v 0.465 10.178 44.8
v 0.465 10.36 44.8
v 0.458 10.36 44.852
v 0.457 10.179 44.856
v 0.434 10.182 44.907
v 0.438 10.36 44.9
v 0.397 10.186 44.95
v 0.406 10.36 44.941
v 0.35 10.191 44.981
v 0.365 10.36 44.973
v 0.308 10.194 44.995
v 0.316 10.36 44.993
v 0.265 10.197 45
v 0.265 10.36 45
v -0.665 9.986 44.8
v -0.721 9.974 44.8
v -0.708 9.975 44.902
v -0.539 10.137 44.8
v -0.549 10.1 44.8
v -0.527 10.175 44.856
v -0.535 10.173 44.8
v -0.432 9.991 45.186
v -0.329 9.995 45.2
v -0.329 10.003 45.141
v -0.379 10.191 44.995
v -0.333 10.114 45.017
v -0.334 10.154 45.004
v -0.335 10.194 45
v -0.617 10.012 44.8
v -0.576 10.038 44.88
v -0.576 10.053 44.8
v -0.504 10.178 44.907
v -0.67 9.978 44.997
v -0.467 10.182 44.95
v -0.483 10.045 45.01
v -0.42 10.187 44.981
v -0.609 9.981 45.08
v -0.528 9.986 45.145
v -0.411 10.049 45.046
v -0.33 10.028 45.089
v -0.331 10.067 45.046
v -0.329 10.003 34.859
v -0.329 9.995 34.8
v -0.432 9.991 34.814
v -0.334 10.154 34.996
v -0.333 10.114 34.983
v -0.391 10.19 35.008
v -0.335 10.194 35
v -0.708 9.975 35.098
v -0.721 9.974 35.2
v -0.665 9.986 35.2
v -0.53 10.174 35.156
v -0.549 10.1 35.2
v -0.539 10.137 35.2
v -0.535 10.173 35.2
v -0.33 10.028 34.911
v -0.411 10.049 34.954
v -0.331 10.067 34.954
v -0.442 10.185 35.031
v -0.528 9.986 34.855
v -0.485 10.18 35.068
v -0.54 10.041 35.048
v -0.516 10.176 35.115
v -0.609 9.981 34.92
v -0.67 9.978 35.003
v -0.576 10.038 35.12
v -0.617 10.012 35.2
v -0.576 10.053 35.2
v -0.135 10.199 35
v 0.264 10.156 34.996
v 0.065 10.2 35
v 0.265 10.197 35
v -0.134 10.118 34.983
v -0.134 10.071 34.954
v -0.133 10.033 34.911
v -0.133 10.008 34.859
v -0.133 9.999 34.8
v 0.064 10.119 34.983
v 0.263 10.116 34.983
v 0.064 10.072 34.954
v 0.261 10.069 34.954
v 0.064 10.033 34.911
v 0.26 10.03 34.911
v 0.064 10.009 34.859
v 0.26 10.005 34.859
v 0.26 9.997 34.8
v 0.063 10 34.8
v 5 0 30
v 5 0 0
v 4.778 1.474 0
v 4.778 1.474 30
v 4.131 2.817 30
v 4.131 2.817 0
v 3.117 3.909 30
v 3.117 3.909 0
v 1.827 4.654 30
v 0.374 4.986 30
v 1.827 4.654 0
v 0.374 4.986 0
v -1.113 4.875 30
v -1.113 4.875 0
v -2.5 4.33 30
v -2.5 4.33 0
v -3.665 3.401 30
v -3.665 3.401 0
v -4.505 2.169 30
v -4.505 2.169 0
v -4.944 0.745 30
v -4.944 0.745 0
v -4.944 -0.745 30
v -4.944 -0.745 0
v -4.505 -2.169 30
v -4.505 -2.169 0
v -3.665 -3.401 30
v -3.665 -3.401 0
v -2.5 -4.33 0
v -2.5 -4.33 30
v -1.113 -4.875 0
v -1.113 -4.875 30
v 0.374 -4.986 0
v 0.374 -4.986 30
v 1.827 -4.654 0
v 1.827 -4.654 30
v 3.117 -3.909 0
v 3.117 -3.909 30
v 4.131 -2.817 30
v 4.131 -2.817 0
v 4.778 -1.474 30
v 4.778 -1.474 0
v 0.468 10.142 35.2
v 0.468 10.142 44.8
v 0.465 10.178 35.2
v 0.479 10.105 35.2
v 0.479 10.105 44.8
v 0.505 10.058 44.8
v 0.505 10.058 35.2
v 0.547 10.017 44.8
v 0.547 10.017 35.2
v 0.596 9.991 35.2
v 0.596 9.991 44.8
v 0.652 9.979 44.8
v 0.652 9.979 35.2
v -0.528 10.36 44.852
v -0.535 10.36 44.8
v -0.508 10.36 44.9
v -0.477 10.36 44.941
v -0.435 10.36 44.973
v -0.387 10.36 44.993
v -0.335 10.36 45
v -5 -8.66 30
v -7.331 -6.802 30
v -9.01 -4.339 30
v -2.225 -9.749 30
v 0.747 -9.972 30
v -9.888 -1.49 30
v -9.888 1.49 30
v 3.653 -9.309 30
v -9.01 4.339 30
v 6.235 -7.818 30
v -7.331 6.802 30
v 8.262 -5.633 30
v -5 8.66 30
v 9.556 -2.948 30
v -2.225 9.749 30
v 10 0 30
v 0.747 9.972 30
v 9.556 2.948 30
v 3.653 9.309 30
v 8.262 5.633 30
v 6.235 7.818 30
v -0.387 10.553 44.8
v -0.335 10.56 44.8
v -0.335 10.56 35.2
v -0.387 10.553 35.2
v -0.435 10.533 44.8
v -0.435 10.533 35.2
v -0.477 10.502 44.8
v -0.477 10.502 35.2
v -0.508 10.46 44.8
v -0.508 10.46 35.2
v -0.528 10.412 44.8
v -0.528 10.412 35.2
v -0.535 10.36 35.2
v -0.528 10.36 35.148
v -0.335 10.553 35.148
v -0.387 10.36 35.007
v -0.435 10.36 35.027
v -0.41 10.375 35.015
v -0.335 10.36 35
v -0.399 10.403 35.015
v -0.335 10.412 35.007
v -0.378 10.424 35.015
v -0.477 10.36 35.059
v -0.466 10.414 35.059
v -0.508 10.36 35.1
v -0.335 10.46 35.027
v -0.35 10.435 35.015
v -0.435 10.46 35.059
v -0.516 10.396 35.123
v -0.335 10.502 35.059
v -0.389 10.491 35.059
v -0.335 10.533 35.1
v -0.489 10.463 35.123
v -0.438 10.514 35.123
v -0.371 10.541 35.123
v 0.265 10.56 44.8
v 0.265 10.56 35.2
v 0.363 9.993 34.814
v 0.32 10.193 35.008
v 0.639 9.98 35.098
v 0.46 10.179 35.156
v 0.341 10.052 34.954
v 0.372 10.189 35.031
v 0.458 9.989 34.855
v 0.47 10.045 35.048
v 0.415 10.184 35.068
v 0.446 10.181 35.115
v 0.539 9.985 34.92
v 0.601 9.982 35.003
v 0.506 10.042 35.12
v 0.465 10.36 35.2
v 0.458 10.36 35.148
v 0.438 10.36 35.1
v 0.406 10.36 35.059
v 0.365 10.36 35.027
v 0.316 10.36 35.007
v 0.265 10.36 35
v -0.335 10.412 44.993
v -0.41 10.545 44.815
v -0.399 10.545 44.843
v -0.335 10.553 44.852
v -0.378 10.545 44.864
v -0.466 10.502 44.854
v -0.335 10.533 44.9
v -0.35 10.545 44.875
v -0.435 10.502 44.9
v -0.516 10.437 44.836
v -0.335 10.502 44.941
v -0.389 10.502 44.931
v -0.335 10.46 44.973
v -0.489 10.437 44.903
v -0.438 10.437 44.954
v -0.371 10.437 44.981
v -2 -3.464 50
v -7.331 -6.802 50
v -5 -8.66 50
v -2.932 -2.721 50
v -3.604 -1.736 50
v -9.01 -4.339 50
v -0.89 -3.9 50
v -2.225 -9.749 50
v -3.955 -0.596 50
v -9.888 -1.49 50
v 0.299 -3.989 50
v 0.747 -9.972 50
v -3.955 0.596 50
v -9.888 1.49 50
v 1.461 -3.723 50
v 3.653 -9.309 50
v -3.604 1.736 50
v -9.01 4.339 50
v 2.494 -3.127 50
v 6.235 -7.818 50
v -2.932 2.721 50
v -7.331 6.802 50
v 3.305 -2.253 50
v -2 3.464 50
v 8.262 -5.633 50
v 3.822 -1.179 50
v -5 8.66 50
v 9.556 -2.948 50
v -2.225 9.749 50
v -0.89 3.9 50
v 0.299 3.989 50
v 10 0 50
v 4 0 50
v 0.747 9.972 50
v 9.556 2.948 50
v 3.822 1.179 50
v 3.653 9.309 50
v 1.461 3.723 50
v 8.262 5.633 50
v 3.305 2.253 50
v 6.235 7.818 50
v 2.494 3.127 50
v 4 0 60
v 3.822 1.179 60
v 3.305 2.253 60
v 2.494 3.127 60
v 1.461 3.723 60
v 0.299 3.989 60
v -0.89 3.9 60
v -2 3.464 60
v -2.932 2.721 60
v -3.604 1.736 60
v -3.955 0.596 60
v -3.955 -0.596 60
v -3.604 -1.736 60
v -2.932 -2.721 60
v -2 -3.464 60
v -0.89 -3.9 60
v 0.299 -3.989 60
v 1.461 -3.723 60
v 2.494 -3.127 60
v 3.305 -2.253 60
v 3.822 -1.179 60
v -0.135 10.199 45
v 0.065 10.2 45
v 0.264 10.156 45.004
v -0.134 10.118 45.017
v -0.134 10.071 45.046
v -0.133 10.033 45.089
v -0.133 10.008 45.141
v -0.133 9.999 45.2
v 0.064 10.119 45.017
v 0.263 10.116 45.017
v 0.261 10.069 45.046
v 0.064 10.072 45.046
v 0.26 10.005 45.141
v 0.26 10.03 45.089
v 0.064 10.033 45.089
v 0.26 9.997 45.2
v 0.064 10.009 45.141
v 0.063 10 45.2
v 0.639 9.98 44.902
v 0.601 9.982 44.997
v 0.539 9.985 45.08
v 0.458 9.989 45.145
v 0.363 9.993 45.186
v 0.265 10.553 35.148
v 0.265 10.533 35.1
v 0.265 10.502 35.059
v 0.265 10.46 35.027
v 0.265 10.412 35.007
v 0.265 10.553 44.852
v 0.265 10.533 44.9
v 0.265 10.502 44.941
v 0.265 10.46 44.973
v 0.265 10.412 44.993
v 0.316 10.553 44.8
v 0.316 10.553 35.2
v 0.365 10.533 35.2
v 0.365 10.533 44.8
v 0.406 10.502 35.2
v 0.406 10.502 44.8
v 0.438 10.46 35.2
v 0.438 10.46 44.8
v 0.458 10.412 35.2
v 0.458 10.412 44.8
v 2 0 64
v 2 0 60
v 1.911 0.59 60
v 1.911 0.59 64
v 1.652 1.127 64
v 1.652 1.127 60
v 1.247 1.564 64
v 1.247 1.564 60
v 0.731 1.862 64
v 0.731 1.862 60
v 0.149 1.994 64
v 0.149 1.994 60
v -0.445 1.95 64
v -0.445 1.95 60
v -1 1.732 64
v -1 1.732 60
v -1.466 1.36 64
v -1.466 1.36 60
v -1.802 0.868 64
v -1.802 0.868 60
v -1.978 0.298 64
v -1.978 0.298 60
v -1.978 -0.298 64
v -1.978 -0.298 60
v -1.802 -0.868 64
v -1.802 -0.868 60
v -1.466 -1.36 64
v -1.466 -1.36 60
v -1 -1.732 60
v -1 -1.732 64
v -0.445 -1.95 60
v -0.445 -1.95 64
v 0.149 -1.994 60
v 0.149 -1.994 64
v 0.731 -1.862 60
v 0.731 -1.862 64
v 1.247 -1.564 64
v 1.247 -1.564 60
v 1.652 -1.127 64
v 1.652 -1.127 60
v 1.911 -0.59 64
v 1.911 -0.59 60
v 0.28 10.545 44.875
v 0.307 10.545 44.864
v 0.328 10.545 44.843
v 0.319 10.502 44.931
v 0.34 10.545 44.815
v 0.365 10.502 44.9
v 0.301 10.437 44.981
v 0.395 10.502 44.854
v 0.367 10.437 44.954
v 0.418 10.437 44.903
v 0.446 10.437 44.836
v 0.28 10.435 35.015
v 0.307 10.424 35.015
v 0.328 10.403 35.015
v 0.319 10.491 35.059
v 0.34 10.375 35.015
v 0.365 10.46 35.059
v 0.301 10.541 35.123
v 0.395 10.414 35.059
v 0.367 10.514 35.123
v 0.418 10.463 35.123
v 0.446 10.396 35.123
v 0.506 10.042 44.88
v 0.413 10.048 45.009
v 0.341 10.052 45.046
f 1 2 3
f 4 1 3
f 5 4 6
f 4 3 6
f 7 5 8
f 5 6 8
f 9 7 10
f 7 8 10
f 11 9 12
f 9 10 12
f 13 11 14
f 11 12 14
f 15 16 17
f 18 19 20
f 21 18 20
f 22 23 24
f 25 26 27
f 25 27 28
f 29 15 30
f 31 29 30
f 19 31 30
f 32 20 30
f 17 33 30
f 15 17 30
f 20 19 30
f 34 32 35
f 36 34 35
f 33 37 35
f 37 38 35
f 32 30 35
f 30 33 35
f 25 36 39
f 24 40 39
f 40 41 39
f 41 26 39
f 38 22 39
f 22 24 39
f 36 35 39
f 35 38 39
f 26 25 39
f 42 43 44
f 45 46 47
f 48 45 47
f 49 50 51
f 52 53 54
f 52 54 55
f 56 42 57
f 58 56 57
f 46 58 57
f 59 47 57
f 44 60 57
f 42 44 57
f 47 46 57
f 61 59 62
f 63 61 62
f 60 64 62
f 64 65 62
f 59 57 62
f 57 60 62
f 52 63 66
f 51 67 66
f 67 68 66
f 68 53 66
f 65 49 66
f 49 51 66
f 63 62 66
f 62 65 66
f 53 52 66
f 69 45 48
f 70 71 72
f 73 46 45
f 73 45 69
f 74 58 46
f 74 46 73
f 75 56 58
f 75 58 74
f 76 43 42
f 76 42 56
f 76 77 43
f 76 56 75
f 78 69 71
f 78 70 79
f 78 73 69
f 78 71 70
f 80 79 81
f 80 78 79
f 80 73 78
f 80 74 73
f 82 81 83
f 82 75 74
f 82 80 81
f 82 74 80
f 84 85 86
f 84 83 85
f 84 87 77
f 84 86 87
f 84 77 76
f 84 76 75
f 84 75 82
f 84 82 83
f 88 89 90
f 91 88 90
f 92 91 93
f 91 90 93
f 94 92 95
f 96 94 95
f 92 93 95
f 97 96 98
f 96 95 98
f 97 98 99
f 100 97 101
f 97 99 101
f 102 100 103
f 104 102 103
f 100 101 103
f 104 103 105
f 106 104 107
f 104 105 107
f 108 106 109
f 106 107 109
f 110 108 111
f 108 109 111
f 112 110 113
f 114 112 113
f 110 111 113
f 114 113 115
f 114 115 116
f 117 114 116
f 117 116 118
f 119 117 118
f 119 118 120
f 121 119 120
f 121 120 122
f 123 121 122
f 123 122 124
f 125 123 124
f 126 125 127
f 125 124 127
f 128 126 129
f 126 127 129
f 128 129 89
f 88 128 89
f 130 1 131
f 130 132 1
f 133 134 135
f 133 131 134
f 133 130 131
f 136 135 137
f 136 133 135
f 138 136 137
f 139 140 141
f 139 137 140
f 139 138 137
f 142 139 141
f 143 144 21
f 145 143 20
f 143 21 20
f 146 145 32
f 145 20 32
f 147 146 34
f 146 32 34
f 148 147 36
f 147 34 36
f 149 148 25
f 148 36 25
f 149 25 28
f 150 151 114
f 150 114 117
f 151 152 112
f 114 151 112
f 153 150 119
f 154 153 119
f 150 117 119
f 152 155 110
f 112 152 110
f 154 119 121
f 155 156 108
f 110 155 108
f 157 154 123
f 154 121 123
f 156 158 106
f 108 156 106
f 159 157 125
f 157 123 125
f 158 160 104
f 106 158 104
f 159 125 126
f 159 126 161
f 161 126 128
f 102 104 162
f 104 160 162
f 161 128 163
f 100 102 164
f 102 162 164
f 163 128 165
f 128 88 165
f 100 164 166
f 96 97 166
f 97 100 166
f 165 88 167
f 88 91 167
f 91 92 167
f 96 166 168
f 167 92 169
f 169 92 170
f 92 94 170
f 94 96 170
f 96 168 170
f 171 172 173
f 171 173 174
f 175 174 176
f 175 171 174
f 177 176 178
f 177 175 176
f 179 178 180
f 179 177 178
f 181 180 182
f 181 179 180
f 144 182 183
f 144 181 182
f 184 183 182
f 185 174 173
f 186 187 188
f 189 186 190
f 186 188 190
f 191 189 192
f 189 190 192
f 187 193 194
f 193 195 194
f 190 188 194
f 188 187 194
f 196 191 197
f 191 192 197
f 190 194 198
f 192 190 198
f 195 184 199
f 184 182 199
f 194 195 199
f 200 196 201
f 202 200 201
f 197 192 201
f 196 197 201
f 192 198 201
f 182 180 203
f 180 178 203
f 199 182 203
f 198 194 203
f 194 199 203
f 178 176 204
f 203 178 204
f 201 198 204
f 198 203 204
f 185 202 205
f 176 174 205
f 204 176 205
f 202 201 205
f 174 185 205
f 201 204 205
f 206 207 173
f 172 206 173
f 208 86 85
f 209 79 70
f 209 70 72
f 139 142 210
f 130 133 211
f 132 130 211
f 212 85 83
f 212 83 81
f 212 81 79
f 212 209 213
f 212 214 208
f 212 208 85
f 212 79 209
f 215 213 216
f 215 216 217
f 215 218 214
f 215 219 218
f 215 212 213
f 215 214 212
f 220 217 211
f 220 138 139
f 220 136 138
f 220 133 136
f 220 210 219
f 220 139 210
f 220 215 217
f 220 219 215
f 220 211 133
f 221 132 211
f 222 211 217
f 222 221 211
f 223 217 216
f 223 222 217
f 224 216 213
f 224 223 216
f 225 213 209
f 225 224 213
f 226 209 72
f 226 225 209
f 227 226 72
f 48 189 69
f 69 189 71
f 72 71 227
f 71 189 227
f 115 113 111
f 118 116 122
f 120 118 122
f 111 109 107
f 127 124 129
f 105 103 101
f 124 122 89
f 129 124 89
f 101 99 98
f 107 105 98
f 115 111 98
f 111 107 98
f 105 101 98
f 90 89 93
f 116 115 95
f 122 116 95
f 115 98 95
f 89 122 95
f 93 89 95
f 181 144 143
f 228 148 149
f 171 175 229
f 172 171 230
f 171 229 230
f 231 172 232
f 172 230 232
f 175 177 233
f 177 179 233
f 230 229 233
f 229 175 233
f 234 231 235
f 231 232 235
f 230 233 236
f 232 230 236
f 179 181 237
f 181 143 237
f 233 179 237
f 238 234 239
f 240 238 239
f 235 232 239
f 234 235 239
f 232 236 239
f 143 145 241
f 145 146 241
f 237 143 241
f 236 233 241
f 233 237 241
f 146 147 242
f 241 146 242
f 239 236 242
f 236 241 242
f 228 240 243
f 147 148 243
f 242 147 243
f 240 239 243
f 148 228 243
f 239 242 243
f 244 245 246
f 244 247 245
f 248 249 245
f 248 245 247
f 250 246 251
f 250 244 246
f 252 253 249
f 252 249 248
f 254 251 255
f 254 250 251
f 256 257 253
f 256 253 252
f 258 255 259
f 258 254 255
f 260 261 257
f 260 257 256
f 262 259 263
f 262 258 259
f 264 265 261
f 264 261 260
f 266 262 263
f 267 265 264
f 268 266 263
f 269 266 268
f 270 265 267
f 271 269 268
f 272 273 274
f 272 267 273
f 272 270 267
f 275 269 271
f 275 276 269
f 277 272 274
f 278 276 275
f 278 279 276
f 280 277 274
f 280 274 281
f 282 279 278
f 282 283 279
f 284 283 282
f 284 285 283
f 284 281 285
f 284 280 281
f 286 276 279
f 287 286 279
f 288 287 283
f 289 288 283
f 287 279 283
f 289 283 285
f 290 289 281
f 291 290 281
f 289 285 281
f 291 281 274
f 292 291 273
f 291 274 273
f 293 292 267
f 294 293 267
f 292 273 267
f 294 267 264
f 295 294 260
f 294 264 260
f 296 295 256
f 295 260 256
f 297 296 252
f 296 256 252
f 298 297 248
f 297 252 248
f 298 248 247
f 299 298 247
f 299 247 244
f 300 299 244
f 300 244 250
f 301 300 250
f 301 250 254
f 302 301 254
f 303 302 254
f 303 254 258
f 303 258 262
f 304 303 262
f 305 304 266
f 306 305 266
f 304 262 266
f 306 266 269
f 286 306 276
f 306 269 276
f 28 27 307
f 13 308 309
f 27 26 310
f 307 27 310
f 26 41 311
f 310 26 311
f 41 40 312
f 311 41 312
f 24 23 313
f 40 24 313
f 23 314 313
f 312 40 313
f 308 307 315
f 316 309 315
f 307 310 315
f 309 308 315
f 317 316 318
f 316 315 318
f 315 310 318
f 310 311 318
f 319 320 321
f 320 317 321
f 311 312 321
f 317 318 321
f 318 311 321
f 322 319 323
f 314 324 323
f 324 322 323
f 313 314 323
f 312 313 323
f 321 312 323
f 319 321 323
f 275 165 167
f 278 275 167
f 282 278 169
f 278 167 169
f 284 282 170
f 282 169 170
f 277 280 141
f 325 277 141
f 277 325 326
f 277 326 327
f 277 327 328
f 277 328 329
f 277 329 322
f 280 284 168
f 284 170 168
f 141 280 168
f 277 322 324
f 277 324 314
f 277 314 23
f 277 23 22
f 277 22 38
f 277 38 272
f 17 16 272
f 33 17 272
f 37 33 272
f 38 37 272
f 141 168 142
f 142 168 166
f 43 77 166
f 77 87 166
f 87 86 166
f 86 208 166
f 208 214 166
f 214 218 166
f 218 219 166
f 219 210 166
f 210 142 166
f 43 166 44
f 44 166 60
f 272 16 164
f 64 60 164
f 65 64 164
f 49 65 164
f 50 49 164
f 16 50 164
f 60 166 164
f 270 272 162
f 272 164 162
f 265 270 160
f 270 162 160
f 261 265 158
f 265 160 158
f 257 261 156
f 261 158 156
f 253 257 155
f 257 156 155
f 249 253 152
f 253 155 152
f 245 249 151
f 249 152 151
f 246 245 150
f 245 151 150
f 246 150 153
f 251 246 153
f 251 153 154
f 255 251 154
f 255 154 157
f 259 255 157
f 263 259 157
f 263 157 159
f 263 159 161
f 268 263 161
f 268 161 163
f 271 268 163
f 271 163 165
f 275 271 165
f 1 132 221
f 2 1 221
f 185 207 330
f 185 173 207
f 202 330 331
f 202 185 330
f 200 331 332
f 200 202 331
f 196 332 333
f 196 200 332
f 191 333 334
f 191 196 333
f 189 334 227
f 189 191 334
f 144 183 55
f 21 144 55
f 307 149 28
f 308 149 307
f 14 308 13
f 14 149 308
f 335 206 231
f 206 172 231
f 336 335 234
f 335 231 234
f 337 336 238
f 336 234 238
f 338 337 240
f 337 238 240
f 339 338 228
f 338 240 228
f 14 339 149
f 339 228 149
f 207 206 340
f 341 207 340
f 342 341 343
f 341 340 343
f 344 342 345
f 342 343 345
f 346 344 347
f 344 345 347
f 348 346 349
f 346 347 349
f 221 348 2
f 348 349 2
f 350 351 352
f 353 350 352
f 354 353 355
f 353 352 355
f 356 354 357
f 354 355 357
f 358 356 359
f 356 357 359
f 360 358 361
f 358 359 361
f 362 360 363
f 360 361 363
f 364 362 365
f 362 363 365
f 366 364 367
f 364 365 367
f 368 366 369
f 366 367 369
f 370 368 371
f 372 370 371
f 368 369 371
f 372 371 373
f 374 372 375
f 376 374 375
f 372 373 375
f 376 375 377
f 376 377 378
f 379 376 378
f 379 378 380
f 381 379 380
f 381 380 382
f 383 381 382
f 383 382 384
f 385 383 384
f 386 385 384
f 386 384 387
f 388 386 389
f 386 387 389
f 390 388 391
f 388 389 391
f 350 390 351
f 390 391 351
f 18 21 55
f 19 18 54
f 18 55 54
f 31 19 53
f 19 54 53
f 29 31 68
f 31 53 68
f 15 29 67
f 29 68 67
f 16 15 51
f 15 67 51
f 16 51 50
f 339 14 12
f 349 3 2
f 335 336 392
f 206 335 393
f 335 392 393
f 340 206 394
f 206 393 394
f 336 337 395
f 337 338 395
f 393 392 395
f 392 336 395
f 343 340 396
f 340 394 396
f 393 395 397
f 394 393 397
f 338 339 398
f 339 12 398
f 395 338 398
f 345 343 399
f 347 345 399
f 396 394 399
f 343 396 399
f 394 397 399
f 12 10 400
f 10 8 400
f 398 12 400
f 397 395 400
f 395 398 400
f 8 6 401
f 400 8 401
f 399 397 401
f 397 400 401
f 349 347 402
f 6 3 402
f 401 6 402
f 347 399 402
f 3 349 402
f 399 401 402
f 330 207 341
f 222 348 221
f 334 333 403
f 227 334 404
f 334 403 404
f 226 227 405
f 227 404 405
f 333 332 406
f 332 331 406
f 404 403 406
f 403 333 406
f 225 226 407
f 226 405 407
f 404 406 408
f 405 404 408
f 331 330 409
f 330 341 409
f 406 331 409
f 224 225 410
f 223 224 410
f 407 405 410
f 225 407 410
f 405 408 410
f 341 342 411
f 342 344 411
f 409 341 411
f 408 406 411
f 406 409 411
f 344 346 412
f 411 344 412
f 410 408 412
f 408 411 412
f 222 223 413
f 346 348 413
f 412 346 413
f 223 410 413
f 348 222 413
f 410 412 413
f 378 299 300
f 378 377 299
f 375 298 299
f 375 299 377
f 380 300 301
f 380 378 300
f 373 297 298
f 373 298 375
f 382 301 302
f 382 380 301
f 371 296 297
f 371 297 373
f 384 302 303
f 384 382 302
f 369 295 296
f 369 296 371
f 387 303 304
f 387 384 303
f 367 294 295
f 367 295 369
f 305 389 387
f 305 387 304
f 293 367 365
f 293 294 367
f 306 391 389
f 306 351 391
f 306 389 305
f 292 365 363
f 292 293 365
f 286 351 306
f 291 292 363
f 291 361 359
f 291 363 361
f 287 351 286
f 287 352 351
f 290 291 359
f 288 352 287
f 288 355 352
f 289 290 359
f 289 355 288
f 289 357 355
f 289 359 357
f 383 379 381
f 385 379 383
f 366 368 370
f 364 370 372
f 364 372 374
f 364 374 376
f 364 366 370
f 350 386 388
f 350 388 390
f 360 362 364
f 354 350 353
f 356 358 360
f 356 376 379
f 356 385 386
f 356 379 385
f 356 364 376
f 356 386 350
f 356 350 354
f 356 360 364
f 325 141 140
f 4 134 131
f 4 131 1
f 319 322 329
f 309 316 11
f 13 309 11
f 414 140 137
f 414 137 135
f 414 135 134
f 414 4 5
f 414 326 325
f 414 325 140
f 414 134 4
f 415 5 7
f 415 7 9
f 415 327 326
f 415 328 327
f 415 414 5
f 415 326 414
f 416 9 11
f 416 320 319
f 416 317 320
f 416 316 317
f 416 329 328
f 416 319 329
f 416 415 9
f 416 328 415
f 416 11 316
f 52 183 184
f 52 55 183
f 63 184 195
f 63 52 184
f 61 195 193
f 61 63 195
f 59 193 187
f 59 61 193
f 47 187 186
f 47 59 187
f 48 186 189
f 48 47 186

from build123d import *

# Parameters (mm, degrees)
SKETCH1_R           = 5
BOSS_EXTRUDE1_DEPTH = 30
SKETCH2_R           = 10
BOSS_EXTRUDE2_DEPTH = 20
SKETCH3_R           = 4
BOSS_EXTRUDE3_DEPTH = 10
SKETCH4_R           = 2
BOSS_EXTRUDE4_DEPTH = 4
BOSS_EXTRUDE5_START = -5
BOSS_EXTRUDE5_DEPTH = 10
FILLET1_R           = 0.2


with BuildPart() as part:
    # Sketch1 → Boss-Extrude1 (new body)
    with BuildSketch(Plane.XY):
        Circle(SKETCH1_R)
    extrude(amount=BOSS_EXTRUDE1_DEPTH)

    # Sketch2 → Boss-Extrude2 (add)
    with BuildSketch(Plane.XY.offset(30)):
        Circle(SKETCH2_R)
    extrude(amount=BOSS_EXTRUDE2_DEPTH)

    # Sketch3 → Boss-Extrude3 (add)
    with BuildSketch(Plane.XY.offset(50)):
        Circle(SKETCH3_R)
    extrude(amount=BOSS_EXTRUDE3_DEPTH)

    # Sketch4 → Boss-Extrude4 (add)
    with BuildSketch(Plane.XY.offset(60)):
        Circle(SKETCH4_R)
    extrude(amount=BOSS_EXTRUDE4_DEPTH)

    # Sketch5 → Boss-Extrude5 (add)
    with BuildSketch(Plane(origin=(0, 0, 30), x_dir=(-1, 0, 0), z_dir=(0, 0, -1)).offset(BOSS_EXTRUDE5_START)):
        with BuildLine():
            Line((-0.464729596, 10.560180083), (0.535270404, 10.560180083))
            Line((0.535270404, 10.560180083), (0.535270404, 9.960180083))
            ThreePointArc((0.535270404, 9.960180083), (0.035314802, 9.97449019), (-0.464729596, 9.963720595))
            Line((-0.464729596, 9.963720595), (-0.464729596, 10.560180083))
        make_face()
    extrude(amount=-BOSS_EXTRUDE5_DEPTH)

    # Fillet1
    fillet1_edges = [part.edges().sort_by_distance(p)[0] for p in [
        (-0.035314575, 9.999937644, 35),
        (-0.535270404, 9.985664004, 40),
        (0.464729596, 9.989195483, 40),
        (-0.035314575, 9.999937644, 45),
        (0.464729596, 10.274687783, 45),
        (-0.535270404, 10.272922043, 45),
        (-0.535270404, 10.560180083, 40),
        (-0.035270404, 10.560180083, 45),
        (0.464729596, 10.560180083, 40),
        (-0.535270404, 10.272922043, 35),
        (-0.035270404, 10.560180083, 35),
        (0.464729596, 10.274687783, 35),
    ]]
    fillet(fillet1_edges, radius=FILLET1_R)


solid = part.part
